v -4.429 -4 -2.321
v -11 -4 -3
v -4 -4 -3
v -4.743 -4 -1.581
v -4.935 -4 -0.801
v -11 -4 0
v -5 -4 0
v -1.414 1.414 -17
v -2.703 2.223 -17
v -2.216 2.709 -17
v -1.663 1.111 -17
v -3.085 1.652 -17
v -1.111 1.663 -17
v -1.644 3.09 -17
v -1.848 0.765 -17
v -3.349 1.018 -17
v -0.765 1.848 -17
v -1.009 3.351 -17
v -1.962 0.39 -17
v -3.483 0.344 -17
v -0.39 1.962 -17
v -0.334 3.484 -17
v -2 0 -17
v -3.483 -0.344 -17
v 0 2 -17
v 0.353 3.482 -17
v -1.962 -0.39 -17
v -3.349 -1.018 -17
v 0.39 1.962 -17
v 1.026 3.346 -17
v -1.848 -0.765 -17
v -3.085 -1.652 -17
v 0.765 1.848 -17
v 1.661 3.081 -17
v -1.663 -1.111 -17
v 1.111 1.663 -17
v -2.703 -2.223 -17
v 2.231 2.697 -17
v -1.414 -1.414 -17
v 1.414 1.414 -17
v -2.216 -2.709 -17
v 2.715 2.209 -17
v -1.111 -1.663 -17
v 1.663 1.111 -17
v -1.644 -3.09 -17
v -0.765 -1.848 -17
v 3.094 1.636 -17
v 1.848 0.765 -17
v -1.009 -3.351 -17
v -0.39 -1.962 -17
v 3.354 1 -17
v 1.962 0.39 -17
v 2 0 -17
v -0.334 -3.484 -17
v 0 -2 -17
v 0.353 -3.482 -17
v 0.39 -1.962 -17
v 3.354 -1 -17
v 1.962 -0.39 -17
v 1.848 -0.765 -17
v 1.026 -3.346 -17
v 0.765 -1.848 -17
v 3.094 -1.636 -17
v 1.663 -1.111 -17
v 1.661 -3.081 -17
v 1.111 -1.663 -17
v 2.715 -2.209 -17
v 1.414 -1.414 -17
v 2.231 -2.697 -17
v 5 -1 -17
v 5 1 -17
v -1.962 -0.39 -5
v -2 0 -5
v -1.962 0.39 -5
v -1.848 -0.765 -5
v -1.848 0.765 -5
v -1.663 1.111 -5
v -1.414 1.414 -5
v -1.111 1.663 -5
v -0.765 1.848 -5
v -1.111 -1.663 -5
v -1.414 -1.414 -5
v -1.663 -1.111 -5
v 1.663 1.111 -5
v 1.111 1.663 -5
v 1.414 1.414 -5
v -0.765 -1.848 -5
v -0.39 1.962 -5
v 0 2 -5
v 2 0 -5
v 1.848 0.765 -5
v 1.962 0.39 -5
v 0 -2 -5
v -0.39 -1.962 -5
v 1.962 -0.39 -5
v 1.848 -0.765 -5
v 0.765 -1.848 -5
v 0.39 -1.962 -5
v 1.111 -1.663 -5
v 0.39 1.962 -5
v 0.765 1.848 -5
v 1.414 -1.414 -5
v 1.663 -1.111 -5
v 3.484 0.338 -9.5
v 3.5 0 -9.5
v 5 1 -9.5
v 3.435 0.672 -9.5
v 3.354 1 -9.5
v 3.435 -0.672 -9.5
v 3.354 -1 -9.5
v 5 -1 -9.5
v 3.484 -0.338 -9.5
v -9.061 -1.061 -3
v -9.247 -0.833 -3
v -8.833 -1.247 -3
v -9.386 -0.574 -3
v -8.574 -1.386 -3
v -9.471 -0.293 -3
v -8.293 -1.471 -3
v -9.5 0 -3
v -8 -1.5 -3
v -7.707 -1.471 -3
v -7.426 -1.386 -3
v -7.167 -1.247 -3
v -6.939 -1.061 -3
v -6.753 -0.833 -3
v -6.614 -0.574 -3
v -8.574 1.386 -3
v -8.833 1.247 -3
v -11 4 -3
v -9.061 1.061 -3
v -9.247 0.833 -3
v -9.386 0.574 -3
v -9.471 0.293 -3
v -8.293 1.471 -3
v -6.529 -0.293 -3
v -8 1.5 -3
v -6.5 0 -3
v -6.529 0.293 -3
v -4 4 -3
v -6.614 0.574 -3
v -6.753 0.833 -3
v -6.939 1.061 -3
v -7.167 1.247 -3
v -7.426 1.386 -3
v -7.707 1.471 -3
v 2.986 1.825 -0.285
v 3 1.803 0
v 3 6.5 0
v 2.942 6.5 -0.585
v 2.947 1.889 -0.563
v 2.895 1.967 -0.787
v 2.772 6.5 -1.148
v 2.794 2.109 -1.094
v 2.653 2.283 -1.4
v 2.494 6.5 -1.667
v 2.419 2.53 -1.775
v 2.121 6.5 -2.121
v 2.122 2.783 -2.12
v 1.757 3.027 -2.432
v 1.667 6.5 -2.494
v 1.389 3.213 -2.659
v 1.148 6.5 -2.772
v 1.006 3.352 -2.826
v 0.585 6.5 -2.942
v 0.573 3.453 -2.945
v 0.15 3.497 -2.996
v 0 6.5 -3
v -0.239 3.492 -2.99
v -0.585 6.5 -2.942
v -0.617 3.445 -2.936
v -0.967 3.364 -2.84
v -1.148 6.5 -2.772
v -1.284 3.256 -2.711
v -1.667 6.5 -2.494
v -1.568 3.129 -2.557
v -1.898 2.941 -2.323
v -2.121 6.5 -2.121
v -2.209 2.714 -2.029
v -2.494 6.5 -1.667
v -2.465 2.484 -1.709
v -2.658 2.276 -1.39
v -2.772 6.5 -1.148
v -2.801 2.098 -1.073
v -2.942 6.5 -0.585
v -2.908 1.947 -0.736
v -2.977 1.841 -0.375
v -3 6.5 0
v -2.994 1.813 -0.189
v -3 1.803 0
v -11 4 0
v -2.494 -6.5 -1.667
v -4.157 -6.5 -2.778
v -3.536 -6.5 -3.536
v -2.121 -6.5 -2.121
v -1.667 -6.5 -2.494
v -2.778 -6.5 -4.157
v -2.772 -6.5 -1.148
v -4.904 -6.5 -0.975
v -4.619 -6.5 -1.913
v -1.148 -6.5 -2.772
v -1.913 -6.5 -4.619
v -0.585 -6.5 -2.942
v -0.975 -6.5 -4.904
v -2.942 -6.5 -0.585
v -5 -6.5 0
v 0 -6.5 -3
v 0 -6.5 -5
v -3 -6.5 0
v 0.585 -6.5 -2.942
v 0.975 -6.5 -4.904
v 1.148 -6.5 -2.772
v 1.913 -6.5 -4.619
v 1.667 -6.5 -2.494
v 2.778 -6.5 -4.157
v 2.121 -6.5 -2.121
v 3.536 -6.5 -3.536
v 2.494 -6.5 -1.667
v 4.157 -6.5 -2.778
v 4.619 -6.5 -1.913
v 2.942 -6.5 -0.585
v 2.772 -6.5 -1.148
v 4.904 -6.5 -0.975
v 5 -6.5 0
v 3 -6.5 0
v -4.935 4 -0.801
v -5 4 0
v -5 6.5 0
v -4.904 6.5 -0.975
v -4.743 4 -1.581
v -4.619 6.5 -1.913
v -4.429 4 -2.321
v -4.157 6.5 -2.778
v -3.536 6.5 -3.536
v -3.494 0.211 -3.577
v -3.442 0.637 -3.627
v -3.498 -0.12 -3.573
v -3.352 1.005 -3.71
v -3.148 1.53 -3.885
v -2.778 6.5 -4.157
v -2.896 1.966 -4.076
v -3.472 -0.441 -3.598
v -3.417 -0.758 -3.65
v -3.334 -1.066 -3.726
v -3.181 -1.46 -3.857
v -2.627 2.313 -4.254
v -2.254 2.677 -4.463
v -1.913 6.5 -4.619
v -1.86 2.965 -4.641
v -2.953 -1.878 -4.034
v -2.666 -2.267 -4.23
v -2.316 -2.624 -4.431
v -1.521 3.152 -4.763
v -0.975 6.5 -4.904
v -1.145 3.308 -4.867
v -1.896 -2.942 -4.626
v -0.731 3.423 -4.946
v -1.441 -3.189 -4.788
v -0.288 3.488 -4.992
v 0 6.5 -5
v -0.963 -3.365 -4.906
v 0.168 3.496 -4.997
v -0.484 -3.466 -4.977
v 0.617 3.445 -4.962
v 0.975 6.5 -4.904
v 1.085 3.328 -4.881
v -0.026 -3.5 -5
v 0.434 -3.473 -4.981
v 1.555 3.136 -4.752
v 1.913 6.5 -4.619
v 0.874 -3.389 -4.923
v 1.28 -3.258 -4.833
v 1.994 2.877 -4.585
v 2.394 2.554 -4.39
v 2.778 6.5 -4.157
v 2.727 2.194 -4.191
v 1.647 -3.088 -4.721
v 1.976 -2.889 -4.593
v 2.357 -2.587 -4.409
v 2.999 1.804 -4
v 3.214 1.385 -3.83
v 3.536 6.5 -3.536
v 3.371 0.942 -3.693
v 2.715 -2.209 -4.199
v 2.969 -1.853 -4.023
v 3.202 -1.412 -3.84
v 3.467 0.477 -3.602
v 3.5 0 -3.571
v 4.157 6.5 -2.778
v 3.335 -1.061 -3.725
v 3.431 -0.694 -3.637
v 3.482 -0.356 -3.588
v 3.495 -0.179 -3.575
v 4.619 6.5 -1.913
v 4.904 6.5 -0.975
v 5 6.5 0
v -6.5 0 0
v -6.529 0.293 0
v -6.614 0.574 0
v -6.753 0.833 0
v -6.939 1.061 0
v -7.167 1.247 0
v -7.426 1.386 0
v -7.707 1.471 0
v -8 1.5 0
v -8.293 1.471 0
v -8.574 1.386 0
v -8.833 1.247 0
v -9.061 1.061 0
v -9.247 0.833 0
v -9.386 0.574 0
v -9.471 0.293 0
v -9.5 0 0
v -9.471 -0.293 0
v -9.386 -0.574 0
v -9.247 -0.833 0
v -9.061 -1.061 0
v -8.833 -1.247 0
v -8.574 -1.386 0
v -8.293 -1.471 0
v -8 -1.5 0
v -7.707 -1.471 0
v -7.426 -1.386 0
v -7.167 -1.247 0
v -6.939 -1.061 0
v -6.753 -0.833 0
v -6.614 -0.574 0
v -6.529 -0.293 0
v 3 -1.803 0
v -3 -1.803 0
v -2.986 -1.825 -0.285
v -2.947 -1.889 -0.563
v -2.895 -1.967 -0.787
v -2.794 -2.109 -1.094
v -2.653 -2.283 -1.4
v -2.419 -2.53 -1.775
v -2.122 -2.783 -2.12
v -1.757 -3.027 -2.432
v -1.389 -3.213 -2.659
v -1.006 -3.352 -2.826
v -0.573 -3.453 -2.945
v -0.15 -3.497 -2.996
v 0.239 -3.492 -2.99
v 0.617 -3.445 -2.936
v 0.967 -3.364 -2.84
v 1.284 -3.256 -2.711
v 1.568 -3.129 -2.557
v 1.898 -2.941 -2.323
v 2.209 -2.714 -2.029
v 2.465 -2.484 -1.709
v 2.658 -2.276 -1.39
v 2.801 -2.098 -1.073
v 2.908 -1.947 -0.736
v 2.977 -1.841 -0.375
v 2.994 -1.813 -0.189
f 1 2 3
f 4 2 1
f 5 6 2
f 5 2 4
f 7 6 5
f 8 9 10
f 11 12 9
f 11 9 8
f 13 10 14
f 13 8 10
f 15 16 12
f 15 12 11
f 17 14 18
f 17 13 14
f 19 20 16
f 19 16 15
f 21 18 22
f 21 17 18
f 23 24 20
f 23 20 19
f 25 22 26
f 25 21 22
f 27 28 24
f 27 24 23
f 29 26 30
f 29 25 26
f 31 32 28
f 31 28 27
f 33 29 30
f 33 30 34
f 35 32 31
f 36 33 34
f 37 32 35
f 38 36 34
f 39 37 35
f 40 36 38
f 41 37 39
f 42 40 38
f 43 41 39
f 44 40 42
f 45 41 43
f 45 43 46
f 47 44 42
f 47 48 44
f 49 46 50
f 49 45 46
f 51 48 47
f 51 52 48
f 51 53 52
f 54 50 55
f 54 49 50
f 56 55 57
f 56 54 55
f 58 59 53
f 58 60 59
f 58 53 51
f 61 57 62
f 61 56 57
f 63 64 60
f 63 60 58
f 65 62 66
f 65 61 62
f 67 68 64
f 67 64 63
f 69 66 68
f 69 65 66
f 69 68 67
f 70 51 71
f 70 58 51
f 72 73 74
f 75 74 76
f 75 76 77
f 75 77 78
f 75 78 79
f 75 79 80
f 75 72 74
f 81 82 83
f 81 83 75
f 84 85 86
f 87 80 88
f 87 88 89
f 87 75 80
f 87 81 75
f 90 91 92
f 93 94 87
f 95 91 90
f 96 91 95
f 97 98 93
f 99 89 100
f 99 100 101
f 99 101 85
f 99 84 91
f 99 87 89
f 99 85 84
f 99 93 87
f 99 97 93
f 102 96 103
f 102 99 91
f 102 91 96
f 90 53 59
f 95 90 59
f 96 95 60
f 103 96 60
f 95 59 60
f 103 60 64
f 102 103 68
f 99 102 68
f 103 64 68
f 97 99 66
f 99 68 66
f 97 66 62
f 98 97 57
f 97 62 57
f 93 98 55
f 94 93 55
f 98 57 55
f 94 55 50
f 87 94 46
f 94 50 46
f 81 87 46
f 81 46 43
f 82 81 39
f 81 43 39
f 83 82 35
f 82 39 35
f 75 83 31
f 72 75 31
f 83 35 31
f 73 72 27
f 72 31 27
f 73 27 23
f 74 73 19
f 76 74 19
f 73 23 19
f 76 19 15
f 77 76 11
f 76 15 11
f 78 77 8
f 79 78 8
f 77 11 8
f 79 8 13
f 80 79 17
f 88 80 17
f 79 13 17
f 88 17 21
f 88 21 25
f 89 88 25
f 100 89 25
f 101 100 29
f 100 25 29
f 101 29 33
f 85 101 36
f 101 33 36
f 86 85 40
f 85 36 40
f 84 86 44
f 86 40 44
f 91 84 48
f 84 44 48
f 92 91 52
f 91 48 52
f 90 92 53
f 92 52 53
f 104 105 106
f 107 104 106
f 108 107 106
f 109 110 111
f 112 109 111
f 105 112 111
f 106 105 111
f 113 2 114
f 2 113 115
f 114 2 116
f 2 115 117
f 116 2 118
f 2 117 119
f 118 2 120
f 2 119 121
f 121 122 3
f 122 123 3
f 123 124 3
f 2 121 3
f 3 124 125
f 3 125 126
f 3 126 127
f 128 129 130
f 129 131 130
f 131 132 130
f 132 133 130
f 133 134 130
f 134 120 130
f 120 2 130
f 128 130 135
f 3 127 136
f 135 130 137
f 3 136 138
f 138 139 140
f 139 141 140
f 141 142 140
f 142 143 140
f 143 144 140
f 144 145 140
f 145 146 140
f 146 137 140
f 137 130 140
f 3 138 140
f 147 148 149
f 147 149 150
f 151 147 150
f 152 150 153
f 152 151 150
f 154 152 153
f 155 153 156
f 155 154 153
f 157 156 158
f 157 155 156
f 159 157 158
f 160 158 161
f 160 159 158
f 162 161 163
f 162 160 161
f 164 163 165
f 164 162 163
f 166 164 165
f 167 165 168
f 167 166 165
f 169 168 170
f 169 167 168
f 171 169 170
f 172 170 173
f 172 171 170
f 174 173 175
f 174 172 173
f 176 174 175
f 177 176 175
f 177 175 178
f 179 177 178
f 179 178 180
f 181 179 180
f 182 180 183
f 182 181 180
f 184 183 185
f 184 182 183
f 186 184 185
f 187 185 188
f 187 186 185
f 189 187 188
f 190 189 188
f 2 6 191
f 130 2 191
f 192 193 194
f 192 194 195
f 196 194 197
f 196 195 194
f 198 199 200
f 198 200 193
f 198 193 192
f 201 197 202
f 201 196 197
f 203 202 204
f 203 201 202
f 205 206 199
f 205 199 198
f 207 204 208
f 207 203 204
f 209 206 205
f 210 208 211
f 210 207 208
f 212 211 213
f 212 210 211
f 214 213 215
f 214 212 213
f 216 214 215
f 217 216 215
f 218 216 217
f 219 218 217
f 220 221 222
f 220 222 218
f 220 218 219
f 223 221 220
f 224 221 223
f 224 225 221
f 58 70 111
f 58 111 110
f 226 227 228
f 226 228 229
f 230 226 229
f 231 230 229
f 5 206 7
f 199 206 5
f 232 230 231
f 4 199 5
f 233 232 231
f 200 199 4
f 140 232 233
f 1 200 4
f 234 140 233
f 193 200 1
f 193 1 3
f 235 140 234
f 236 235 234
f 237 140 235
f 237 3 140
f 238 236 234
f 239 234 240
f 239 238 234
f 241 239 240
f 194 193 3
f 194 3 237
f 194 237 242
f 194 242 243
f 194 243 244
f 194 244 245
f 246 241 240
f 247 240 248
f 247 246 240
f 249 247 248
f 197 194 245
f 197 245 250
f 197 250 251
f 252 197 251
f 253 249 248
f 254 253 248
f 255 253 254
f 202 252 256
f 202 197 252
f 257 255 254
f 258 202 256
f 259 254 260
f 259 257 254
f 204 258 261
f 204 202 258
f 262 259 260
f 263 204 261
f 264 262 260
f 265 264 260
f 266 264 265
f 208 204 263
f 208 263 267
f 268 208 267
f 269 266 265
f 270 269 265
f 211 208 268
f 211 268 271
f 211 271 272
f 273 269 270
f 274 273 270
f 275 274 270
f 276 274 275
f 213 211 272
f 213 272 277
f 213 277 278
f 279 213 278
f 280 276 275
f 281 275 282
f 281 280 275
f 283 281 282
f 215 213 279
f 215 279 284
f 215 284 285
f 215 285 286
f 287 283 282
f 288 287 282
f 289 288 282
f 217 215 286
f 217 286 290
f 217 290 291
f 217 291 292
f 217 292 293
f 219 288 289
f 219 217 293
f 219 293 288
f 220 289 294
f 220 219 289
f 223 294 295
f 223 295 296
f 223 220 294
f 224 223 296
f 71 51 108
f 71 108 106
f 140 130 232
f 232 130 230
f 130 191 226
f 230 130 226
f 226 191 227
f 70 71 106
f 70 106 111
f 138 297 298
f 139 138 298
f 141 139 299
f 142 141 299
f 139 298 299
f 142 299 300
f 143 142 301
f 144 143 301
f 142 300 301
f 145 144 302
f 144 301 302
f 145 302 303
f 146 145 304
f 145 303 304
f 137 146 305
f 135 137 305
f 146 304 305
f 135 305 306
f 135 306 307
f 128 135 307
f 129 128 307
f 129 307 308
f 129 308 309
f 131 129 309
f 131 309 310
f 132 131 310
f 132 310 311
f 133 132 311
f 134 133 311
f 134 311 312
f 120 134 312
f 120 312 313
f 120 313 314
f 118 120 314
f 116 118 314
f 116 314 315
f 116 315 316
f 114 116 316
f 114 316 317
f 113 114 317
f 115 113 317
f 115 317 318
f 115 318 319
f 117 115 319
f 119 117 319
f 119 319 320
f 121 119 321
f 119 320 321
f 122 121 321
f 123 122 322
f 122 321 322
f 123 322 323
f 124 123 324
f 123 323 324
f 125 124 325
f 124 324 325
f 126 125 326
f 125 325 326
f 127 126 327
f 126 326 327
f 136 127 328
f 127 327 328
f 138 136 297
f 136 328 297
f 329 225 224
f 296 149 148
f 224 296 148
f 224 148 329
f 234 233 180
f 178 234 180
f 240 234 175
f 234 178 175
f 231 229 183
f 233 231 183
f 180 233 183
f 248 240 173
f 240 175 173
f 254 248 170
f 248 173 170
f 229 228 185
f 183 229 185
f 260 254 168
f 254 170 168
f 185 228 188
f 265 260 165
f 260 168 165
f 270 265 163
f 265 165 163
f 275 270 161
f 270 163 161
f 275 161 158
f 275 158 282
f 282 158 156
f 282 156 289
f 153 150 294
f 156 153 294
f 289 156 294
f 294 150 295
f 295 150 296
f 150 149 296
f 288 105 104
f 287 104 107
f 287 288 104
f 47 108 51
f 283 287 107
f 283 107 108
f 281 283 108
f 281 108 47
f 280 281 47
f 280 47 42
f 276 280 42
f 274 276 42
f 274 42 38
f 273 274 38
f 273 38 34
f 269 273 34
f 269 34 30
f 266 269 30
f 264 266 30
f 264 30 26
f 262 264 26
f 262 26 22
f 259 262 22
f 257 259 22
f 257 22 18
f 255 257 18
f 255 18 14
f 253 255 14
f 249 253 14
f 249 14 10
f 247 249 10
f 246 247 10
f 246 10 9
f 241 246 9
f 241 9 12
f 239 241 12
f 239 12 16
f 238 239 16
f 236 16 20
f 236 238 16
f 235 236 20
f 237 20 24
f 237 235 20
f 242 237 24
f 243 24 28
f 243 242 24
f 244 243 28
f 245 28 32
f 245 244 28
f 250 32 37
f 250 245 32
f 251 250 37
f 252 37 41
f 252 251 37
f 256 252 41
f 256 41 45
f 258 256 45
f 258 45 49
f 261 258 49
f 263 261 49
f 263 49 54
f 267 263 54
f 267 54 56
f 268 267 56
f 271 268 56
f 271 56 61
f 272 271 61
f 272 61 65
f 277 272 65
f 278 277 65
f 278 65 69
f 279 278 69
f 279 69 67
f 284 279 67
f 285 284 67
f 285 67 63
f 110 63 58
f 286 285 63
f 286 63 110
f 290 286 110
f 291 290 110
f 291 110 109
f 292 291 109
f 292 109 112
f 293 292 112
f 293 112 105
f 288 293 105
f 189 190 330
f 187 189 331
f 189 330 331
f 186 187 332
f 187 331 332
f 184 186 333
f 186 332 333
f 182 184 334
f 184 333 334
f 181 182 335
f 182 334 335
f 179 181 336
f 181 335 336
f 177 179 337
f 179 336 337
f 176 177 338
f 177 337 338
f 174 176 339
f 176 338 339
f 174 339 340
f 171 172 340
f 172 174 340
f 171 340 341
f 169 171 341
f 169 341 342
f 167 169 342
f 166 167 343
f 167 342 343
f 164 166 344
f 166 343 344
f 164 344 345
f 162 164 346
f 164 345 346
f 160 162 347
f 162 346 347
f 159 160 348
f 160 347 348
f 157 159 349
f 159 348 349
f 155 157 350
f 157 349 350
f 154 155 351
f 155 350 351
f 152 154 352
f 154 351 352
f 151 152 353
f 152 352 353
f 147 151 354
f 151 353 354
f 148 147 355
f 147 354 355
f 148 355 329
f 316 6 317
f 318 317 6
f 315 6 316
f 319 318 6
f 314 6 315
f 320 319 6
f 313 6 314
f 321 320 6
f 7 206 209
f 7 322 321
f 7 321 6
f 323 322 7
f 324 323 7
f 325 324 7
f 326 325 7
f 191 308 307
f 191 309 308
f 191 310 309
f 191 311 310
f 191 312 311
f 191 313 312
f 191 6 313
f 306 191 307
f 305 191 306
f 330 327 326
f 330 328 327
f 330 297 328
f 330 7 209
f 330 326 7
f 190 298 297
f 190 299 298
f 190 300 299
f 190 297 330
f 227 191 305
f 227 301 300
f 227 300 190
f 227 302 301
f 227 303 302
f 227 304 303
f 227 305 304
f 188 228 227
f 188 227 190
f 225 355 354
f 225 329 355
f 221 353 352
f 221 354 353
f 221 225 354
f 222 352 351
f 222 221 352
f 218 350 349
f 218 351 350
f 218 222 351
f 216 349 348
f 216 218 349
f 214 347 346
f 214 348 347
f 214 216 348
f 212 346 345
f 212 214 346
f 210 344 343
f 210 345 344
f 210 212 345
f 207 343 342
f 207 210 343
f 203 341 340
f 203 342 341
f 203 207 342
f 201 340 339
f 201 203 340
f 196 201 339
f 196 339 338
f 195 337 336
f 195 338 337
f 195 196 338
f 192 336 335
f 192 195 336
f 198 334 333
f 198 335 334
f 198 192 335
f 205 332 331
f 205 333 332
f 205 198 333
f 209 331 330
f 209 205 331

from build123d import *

# Parameters (mm, degrees)
F1_DEPTH  = 6.5
F2_W      = 8
F2_H      = 8
F3_DEPTH  = 3
F4_R      = 3.5
F5_DEPTH  = 17
F6_R      = 3
F7_DEPTH  = 9.3
F8_R      = 2
F9_DEPTH  = 12
F10_R     = 1.5
F11_DEPTH = 17.001
F13_DEPTH = 7.5


with BuildPart() as f1:
    # F0 (on Front) → F1 (new body, symmetric)
    with BuildSketch(Plane.XZ):
        with BuildLine():
            Line((-3, 0), (-5, 0))
            ThreePointArc((-5, 0), (0, -5), (5, 0))
            Line((5, 0), (3, 0))
            ThreePointArc((3, 0), (0, -3), (-3, 0))
        make_face()
    extrude(amount=F1_DEPTH, both=True)

    # F2 (on Top) → F3 (join)
    with BuildSketch(Plane.XY):
        with Locations((-7, 0)):
            Rectangle(F2_W, F2_H)
    extrude(amount=-F3_DEPTH)

    # F4 (on Top) → F5 (join)
    with BuildSketch(Plane.XY):
        Circle(F4_R)
    extrude(amount=-F5_DEPTH)

    # F6 (on Front) → F7 (cut, symmetric)
    with BuildSketch(Plane.XZ):
        Circle(F6_R)
    extrude(amount=F7_DEPTH, both=True, mode=Mode.SUBTRACT)

    # F8 (on face) → F9 (cut)
    with BuildSketch(Plane(origin=(0, 0, -17), x_dir=(1, 0, 0), z_dir=(0, 0, -1))):
        Circle(F8_R)
    extrude(amount=-F9_DEPTH, mode=Mode.SUBTRACT)

    # F10 (on face) → F11 (cut, through all)
    with BuildSketch(Plane.XY):
        with Locations((-8, 0)):
            Circle(F10_R)
    extrude(amount=-F11_DEPTH, mode=Mode.SUBTRACT)

    # F12 (on face) → F13 (join)
    with BuildSketch(Plane(origin=(0, 0, -17), x_dir=(1, 0, 0), z_dir=(0, 0, -1))):
        with BuildLine():
            ThreePointArc((3.354102, 1), (3.5, 0), (3.354102, -1))
            Line((3.354102, -1), (5, -1))
            Line((5, -1), (5, 1))
            Line((5, 1), (3.354102, 1))
        make_face()
    extrude(amount=-F13_DEPTH)


solid = f1.part
